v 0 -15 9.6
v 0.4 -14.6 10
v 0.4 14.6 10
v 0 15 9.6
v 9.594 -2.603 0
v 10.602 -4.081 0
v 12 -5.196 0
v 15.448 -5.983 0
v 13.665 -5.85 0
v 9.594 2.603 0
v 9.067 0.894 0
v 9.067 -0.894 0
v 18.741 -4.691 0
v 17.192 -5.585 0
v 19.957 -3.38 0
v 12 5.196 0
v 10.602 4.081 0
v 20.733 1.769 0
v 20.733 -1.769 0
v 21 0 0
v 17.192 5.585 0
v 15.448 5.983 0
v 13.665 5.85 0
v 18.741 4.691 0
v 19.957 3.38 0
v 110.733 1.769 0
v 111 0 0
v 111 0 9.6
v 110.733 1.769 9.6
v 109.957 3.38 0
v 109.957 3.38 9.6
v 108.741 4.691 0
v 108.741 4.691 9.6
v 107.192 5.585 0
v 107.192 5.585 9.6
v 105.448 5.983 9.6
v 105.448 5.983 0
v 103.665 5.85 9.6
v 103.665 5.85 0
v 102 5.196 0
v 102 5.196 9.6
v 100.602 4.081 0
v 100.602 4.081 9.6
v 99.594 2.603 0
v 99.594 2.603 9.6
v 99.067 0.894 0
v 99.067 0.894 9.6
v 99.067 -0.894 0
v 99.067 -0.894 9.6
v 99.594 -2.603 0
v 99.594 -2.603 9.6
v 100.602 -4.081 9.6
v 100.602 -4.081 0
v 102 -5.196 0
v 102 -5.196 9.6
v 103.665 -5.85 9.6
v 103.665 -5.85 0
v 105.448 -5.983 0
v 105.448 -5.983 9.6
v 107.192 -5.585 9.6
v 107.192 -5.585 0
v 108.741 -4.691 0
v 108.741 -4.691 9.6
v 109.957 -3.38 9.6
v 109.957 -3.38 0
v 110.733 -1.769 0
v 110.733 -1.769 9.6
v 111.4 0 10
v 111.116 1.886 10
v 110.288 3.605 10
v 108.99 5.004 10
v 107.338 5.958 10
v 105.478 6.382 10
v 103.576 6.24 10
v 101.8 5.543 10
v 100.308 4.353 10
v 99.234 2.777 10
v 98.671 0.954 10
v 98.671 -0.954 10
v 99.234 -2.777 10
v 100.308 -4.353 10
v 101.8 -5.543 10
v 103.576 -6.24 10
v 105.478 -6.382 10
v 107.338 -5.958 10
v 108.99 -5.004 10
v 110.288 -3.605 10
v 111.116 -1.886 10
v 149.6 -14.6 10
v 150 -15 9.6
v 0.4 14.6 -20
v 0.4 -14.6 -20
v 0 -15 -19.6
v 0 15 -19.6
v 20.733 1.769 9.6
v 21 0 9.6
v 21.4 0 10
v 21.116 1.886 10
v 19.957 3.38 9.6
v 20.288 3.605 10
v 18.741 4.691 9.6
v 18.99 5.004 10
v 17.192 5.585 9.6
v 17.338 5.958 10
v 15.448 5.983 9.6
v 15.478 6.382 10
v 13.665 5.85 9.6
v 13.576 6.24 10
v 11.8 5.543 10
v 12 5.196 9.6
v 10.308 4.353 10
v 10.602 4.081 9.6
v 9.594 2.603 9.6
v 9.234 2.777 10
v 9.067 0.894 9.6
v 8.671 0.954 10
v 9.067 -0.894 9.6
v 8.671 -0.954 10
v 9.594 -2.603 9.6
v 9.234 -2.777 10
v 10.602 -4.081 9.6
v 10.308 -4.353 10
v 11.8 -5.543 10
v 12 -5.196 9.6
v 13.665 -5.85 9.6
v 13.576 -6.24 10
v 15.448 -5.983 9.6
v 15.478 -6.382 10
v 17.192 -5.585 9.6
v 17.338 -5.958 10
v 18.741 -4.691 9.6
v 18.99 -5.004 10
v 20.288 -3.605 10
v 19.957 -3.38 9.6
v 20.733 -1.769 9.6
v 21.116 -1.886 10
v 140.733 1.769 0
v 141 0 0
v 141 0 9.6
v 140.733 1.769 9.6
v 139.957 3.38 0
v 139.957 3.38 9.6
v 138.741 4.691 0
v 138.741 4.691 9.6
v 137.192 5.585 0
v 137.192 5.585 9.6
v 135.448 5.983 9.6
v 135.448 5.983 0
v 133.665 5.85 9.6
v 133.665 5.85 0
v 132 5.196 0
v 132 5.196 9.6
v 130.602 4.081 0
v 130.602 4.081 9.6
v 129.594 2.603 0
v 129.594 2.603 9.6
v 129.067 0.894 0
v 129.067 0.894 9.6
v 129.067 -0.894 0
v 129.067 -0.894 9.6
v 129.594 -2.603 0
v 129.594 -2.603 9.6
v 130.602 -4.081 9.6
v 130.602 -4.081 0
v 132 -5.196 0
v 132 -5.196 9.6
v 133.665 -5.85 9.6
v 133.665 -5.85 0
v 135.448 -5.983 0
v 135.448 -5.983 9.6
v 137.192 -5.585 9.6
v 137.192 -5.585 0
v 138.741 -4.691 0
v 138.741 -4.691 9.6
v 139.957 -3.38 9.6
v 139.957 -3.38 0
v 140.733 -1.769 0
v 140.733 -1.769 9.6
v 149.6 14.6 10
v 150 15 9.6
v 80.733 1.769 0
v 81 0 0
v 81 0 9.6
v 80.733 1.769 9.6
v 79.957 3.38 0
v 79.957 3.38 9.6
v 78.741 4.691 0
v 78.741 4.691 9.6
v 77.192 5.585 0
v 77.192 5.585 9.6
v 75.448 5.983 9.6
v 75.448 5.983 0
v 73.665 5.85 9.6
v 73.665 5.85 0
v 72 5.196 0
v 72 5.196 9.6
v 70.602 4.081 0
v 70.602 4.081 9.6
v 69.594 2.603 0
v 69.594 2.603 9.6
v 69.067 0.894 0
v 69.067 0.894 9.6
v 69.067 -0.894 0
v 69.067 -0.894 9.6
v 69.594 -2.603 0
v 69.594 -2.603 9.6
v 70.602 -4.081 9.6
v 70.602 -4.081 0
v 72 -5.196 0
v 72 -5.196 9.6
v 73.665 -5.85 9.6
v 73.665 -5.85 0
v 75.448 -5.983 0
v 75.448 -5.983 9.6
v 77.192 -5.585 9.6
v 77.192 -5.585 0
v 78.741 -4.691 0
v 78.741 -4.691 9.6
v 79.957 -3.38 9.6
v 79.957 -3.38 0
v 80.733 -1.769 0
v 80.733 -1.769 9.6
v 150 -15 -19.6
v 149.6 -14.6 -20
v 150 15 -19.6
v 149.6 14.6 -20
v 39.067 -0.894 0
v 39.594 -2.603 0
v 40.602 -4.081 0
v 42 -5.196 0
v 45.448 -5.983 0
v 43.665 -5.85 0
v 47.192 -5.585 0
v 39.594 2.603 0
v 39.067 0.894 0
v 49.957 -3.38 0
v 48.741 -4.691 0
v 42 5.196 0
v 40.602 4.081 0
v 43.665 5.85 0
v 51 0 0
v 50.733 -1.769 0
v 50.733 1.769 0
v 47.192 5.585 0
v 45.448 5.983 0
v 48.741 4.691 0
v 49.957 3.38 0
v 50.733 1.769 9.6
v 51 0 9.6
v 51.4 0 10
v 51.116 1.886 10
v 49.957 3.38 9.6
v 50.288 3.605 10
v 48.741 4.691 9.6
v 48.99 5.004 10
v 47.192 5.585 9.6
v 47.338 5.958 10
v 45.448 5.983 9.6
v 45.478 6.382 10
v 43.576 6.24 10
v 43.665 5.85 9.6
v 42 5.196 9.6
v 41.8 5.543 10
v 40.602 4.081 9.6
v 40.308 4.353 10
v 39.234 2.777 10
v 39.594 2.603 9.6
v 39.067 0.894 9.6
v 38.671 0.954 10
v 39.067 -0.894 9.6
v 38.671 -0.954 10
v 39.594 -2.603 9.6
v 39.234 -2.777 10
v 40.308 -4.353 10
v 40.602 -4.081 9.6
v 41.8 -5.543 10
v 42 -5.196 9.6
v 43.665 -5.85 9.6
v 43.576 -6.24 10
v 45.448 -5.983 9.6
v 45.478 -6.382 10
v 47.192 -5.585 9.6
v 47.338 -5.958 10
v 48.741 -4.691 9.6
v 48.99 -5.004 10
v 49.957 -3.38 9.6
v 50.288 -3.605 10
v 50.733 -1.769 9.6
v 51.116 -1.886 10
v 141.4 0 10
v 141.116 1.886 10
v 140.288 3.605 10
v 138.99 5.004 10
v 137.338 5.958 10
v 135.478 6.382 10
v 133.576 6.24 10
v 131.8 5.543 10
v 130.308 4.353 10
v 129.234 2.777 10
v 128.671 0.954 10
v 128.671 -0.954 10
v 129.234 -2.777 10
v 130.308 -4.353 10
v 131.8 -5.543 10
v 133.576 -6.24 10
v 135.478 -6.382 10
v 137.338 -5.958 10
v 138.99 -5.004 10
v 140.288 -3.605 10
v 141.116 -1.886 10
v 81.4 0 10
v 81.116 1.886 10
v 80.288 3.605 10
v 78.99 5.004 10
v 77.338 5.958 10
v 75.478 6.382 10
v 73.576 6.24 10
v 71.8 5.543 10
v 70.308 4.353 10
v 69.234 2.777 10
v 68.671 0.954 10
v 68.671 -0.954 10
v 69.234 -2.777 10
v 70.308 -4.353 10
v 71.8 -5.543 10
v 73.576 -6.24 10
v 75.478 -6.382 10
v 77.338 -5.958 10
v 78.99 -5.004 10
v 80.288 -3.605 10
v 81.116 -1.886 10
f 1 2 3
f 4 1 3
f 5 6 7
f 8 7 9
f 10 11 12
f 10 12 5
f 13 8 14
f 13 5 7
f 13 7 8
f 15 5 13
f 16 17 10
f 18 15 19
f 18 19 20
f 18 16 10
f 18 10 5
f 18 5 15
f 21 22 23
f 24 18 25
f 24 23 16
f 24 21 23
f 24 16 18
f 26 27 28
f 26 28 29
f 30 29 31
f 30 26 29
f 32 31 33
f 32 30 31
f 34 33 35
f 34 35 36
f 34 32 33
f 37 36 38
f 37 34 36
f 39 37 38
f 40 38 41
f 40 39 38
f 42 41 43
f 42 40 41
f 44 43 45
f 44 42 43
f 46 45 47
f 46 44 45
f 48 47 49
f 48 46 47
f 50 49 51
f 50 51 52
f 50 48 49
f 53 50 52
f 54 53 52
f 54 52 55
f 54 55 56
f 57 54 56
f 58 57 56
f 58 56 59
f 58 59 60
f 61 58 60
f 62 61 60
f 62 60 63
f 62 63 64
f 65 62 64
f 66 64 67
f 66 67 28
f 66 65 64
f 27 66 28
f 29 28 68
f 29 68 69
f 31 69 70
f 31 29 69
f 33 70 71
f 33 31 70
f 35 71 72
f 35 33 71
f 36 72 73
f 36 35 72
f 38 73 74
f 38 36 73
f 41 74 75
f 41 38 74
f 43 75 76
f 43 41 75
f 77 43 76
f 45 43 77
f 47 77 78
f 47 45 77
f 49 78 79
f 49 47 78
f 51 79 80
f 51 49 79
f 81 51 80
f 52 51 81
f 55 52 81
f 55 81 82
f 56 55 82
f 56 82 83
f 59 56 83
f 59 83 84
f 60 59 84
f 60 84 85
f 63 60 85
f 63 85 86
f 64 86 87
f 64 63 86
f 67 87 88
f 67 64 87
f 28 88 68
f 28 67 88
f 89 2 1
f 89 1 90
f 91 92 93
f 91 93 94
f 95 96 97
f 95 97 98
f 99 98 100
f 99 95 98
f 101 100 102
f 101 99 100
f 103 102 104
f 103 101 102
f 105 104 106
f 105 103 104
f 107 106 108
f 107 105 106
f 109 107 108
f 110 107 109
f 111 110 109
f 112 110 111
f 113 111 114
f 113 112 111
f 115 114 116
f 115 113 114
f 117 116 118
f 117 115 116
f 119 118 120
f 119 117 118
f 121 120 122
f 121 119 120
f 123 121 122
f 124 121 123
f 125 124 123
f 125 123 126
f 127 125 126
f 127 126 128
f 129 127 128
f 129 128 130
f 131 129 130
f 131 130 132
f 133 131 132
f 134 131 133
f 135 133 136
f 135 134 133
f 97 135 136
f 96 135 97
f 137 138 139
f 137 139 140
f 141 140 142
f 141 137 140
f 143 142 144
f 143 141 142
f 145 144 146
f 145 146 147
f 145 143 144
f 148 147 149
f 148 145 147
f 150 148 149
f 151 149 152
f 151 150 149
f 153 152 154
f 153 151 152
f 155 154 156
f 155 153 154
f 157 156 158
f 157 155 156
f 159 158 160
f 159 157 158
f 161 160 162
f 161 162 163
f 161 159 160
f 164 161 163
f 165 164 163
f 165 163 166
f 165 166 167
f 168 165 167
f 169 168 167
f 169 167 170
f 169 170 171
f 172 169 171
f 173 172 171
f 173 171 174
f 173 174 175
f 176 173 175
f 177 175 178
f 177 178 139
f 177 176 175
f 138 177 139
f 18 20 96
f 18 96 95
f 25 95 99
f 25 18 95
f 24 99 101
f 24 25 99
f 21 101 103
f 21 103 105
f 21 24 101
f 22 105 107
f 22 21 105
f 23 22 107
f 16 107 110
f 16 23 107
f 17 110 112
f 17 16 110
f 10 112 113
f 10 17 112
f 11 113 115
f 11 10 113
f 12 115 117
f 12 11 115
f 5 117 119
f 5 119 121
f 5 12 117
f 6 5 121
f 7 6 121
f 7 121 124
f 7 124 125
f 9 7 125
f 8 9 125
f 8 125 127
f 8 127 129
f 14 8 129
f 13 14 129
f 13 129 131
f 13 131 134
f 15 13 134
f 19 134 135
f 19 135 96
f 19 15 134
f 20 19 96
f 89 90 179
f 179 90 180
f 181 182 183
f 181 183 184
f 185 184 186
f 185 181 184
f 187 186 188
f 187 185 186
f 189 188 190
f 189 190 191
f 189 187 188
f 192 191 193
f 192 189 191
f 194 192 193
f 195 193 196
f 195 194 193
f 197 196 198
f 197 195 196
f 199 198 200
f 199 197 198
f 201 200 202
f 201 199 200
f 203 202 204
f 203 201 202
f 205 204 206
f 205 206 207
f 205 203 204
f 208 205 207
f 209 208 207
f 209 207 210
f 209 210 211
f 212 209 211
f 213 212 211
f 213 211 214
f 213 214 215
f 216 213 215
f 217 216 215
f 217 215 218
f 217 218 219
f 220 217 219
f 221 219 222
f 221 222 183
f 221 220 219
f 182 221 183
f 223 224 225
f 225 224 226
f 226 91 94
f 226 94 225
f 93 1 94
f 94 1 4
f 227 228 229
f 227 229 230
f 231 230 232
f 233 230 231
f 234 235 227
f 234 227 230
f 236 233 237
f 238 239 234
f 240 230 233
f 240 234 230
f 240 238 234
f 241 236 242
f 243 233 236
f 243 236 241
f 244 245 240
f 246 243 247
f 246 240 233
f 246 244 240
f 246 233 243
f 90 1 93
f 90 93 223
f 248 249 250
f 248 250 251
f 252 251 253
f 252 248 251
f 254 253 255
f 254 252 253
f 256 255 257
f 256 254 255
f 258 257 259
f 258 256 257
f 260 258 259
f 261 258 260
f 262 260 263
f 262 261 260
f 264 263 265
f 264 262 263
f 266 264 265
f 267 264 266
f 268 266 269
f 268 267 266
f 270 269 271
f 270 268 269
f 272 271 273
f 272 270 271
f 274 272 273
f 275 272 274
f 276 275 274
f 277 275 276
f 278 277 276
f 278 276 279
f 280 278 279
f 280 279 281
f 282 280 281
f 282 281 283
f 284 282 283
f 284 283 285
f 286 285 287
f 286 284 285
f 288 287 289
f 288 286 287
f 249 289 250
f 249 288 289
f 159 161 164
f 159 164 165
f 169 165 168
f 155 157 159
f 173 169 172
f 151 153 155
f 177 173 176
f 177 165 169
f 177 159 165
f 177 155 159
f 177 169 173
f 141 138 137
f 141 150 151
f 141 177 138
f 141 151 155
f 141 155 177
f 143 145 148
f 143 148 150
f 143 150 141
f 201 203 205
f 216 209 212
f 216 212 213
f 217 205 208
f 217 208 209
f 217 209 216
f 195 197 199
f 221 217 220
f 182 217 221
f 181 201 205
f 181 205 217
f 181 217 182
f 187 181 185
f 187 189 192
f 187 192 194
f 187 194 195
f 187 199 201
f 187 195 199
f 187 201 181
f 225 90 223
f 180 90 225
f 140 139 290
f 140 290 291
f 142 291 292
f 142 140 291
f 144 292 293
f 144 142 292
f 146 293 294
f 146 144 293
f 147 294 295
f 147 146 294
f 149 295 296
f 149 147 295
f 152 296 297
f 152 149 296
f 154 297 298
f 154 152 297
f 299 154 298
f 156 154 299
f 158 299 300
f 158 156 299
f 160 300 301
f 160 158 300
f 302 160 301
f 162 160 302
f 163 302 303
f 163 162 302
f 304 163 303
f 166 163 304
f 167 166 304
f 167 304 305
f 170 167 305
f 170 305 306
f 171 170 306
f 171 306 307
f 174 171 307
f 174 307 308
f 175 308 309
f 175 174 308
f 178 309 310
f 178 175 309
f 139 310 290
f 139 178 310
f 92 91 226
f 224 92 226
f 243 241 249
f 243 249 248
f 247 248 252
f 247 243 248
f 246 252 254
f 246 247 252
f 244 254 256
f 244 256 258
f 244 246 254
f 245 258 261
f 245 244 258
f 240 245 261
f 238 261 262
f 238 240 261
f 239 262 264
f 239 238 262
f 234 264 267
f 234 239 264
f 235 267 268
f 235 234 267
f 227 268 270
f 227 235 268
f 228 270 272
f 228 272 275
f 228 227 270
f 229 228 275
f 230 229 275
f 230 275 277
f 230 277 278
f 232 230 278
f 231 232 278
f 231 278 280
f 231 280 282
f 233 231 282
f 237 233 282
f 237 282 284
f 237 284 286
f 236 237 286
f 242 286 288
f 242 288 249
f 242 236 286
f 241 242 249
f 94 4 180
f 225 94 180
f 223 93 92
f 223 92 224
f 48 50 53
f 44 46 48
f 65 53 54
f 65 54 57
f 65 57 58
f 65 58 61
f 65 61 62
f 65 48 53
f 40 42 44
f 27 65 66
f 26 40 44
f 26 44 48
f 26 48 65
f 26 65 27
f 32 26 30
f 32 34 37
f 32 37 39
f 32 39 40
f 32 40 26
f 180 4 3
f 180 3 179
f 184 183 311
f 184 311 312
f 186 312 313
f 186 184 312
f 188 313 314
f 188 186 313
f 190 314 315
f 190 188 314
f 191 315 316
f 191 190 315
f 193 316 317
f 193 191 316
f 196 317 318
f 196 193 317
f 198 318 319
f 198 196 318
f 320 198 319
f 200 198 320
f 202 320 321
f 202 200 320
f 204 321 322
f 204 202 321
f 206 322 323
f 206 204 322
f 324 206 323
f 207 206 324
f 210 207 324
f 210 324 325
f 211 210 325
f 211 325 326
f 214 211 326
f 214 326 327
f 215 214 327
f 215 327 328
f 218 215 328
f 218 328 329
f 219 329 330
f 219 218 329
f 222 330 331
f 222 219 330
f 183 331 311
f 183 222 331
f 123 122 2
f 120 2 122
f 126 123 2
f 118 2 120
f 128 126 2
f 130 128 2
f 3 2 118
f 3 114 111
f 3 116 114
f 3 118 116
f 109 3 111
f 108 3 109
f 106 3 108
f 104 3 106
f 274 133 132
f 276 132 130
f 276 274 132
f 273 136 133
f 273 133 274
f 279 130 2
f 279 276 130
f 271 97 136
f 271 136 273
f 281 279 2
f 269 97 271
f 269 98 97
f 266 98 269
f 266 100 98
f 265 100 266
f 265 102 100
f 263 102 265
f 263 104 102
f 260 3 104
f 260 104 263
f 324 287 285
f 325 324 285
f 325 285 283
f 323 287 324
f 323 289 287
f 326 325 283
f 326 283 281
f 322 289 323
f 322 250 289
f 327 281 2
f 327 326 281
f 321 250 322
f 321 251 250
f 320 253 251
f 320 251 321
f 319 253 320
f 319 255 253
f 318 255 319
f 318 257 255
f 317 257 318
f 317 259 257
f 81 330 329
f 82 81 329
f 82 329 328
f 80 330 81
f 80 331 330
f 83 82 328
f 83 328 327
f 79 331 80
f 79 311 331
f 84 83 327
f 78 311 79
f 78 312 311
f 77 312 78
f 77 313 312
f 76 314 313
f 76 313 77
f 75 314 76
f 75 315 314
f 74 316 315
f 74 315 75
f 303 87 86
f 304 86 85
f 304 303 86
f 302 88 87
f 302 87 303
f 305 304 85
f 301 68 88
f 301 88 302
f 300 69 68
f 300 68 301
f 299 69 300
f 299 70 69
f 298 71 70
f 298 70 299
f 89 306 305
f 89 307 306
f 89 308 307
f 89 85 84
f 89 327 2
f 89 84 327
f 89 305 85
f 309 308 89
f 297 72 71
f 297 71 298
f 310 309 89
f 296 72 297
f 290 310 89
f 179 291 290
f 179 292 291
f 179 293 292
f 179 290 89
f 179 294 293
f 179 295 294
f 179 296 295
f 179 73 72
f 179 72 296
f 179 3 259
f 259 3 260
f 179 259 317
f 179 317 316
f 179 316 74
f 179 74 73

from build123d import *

# Parameters (mm, degrees)
EXPORT001_W     = 150
EXPORT001_H     = 30
EXPORT001_R     = 6
PAD_DEPTH       = 10
EXPORT002_W     = 150
EXPORT002_H     = 30
PAD001_DEPTH    = 20
CHAMFER_SIZE    = 0.4
CHAMFER001_SIZE = 0.4


with BuildPart() as part:
    # Export001 → Pad (new body)
    with BuildSketch(Plane.XY):
        with Locations((75, 0)):
            Rectangle(EXPORT001_W, EXPORT001_H)
        with Locations((15, 0)):
            Circle(EXPORT001_R, mode=Mode.SUBTRACT)
        with Locations((45, 0)):
            Circle(EXPORT001_R, mode=Mode.SUBTRACT)
        with Locations((75, 0)):
            Circle(EXPORT001_R, mode=Mode.SUBTRACT)
        with Locations((105, 0)):
            Circle(EXPORT001_R, mode=Mode.SUBTRACT)
        with Locations((135, 0)):
            Circle(EXPORT001_R, mode=Mode.SUBTRACT)
    extrude(amount=PAD_DEPTH)

    # Export002 → Pad001 (join)
    with BuildSketch(Plane.XY):
        with Locations((75, 0)):
            Rectangle(EXPORT002_W, EXPORT002_H)
    extrude(amount=-PAD001_DEPTH)

    # Chamfer
    chamfer_edges = [part.edges().sort_by_distance(p)[0] for p in [
        (75, 15, -20),
        (150, 0, -20),
        (75, -15, -20),
        (0, 0, -20),
    ]]
    chamfer(chamfer_edges, length=CHAMFER_SIZE)

    # Chamfer001
    chamfer001_edges = [part.edges().sort_by_distance(p)[0] for p in [
        (75, 15, 10),
        (150, 0, 10),
        (75, -15, 10),
        (0, 0, 10),
        (129, 0, 10),
        (99, 0, 10),
        (69, 0, 10),
        (39, 0, 10),
        (9, 0, 10),
    ]]
    chamfer(chamfer001_edges, length=CHAMFER001_SIZE)


solid = part.part
